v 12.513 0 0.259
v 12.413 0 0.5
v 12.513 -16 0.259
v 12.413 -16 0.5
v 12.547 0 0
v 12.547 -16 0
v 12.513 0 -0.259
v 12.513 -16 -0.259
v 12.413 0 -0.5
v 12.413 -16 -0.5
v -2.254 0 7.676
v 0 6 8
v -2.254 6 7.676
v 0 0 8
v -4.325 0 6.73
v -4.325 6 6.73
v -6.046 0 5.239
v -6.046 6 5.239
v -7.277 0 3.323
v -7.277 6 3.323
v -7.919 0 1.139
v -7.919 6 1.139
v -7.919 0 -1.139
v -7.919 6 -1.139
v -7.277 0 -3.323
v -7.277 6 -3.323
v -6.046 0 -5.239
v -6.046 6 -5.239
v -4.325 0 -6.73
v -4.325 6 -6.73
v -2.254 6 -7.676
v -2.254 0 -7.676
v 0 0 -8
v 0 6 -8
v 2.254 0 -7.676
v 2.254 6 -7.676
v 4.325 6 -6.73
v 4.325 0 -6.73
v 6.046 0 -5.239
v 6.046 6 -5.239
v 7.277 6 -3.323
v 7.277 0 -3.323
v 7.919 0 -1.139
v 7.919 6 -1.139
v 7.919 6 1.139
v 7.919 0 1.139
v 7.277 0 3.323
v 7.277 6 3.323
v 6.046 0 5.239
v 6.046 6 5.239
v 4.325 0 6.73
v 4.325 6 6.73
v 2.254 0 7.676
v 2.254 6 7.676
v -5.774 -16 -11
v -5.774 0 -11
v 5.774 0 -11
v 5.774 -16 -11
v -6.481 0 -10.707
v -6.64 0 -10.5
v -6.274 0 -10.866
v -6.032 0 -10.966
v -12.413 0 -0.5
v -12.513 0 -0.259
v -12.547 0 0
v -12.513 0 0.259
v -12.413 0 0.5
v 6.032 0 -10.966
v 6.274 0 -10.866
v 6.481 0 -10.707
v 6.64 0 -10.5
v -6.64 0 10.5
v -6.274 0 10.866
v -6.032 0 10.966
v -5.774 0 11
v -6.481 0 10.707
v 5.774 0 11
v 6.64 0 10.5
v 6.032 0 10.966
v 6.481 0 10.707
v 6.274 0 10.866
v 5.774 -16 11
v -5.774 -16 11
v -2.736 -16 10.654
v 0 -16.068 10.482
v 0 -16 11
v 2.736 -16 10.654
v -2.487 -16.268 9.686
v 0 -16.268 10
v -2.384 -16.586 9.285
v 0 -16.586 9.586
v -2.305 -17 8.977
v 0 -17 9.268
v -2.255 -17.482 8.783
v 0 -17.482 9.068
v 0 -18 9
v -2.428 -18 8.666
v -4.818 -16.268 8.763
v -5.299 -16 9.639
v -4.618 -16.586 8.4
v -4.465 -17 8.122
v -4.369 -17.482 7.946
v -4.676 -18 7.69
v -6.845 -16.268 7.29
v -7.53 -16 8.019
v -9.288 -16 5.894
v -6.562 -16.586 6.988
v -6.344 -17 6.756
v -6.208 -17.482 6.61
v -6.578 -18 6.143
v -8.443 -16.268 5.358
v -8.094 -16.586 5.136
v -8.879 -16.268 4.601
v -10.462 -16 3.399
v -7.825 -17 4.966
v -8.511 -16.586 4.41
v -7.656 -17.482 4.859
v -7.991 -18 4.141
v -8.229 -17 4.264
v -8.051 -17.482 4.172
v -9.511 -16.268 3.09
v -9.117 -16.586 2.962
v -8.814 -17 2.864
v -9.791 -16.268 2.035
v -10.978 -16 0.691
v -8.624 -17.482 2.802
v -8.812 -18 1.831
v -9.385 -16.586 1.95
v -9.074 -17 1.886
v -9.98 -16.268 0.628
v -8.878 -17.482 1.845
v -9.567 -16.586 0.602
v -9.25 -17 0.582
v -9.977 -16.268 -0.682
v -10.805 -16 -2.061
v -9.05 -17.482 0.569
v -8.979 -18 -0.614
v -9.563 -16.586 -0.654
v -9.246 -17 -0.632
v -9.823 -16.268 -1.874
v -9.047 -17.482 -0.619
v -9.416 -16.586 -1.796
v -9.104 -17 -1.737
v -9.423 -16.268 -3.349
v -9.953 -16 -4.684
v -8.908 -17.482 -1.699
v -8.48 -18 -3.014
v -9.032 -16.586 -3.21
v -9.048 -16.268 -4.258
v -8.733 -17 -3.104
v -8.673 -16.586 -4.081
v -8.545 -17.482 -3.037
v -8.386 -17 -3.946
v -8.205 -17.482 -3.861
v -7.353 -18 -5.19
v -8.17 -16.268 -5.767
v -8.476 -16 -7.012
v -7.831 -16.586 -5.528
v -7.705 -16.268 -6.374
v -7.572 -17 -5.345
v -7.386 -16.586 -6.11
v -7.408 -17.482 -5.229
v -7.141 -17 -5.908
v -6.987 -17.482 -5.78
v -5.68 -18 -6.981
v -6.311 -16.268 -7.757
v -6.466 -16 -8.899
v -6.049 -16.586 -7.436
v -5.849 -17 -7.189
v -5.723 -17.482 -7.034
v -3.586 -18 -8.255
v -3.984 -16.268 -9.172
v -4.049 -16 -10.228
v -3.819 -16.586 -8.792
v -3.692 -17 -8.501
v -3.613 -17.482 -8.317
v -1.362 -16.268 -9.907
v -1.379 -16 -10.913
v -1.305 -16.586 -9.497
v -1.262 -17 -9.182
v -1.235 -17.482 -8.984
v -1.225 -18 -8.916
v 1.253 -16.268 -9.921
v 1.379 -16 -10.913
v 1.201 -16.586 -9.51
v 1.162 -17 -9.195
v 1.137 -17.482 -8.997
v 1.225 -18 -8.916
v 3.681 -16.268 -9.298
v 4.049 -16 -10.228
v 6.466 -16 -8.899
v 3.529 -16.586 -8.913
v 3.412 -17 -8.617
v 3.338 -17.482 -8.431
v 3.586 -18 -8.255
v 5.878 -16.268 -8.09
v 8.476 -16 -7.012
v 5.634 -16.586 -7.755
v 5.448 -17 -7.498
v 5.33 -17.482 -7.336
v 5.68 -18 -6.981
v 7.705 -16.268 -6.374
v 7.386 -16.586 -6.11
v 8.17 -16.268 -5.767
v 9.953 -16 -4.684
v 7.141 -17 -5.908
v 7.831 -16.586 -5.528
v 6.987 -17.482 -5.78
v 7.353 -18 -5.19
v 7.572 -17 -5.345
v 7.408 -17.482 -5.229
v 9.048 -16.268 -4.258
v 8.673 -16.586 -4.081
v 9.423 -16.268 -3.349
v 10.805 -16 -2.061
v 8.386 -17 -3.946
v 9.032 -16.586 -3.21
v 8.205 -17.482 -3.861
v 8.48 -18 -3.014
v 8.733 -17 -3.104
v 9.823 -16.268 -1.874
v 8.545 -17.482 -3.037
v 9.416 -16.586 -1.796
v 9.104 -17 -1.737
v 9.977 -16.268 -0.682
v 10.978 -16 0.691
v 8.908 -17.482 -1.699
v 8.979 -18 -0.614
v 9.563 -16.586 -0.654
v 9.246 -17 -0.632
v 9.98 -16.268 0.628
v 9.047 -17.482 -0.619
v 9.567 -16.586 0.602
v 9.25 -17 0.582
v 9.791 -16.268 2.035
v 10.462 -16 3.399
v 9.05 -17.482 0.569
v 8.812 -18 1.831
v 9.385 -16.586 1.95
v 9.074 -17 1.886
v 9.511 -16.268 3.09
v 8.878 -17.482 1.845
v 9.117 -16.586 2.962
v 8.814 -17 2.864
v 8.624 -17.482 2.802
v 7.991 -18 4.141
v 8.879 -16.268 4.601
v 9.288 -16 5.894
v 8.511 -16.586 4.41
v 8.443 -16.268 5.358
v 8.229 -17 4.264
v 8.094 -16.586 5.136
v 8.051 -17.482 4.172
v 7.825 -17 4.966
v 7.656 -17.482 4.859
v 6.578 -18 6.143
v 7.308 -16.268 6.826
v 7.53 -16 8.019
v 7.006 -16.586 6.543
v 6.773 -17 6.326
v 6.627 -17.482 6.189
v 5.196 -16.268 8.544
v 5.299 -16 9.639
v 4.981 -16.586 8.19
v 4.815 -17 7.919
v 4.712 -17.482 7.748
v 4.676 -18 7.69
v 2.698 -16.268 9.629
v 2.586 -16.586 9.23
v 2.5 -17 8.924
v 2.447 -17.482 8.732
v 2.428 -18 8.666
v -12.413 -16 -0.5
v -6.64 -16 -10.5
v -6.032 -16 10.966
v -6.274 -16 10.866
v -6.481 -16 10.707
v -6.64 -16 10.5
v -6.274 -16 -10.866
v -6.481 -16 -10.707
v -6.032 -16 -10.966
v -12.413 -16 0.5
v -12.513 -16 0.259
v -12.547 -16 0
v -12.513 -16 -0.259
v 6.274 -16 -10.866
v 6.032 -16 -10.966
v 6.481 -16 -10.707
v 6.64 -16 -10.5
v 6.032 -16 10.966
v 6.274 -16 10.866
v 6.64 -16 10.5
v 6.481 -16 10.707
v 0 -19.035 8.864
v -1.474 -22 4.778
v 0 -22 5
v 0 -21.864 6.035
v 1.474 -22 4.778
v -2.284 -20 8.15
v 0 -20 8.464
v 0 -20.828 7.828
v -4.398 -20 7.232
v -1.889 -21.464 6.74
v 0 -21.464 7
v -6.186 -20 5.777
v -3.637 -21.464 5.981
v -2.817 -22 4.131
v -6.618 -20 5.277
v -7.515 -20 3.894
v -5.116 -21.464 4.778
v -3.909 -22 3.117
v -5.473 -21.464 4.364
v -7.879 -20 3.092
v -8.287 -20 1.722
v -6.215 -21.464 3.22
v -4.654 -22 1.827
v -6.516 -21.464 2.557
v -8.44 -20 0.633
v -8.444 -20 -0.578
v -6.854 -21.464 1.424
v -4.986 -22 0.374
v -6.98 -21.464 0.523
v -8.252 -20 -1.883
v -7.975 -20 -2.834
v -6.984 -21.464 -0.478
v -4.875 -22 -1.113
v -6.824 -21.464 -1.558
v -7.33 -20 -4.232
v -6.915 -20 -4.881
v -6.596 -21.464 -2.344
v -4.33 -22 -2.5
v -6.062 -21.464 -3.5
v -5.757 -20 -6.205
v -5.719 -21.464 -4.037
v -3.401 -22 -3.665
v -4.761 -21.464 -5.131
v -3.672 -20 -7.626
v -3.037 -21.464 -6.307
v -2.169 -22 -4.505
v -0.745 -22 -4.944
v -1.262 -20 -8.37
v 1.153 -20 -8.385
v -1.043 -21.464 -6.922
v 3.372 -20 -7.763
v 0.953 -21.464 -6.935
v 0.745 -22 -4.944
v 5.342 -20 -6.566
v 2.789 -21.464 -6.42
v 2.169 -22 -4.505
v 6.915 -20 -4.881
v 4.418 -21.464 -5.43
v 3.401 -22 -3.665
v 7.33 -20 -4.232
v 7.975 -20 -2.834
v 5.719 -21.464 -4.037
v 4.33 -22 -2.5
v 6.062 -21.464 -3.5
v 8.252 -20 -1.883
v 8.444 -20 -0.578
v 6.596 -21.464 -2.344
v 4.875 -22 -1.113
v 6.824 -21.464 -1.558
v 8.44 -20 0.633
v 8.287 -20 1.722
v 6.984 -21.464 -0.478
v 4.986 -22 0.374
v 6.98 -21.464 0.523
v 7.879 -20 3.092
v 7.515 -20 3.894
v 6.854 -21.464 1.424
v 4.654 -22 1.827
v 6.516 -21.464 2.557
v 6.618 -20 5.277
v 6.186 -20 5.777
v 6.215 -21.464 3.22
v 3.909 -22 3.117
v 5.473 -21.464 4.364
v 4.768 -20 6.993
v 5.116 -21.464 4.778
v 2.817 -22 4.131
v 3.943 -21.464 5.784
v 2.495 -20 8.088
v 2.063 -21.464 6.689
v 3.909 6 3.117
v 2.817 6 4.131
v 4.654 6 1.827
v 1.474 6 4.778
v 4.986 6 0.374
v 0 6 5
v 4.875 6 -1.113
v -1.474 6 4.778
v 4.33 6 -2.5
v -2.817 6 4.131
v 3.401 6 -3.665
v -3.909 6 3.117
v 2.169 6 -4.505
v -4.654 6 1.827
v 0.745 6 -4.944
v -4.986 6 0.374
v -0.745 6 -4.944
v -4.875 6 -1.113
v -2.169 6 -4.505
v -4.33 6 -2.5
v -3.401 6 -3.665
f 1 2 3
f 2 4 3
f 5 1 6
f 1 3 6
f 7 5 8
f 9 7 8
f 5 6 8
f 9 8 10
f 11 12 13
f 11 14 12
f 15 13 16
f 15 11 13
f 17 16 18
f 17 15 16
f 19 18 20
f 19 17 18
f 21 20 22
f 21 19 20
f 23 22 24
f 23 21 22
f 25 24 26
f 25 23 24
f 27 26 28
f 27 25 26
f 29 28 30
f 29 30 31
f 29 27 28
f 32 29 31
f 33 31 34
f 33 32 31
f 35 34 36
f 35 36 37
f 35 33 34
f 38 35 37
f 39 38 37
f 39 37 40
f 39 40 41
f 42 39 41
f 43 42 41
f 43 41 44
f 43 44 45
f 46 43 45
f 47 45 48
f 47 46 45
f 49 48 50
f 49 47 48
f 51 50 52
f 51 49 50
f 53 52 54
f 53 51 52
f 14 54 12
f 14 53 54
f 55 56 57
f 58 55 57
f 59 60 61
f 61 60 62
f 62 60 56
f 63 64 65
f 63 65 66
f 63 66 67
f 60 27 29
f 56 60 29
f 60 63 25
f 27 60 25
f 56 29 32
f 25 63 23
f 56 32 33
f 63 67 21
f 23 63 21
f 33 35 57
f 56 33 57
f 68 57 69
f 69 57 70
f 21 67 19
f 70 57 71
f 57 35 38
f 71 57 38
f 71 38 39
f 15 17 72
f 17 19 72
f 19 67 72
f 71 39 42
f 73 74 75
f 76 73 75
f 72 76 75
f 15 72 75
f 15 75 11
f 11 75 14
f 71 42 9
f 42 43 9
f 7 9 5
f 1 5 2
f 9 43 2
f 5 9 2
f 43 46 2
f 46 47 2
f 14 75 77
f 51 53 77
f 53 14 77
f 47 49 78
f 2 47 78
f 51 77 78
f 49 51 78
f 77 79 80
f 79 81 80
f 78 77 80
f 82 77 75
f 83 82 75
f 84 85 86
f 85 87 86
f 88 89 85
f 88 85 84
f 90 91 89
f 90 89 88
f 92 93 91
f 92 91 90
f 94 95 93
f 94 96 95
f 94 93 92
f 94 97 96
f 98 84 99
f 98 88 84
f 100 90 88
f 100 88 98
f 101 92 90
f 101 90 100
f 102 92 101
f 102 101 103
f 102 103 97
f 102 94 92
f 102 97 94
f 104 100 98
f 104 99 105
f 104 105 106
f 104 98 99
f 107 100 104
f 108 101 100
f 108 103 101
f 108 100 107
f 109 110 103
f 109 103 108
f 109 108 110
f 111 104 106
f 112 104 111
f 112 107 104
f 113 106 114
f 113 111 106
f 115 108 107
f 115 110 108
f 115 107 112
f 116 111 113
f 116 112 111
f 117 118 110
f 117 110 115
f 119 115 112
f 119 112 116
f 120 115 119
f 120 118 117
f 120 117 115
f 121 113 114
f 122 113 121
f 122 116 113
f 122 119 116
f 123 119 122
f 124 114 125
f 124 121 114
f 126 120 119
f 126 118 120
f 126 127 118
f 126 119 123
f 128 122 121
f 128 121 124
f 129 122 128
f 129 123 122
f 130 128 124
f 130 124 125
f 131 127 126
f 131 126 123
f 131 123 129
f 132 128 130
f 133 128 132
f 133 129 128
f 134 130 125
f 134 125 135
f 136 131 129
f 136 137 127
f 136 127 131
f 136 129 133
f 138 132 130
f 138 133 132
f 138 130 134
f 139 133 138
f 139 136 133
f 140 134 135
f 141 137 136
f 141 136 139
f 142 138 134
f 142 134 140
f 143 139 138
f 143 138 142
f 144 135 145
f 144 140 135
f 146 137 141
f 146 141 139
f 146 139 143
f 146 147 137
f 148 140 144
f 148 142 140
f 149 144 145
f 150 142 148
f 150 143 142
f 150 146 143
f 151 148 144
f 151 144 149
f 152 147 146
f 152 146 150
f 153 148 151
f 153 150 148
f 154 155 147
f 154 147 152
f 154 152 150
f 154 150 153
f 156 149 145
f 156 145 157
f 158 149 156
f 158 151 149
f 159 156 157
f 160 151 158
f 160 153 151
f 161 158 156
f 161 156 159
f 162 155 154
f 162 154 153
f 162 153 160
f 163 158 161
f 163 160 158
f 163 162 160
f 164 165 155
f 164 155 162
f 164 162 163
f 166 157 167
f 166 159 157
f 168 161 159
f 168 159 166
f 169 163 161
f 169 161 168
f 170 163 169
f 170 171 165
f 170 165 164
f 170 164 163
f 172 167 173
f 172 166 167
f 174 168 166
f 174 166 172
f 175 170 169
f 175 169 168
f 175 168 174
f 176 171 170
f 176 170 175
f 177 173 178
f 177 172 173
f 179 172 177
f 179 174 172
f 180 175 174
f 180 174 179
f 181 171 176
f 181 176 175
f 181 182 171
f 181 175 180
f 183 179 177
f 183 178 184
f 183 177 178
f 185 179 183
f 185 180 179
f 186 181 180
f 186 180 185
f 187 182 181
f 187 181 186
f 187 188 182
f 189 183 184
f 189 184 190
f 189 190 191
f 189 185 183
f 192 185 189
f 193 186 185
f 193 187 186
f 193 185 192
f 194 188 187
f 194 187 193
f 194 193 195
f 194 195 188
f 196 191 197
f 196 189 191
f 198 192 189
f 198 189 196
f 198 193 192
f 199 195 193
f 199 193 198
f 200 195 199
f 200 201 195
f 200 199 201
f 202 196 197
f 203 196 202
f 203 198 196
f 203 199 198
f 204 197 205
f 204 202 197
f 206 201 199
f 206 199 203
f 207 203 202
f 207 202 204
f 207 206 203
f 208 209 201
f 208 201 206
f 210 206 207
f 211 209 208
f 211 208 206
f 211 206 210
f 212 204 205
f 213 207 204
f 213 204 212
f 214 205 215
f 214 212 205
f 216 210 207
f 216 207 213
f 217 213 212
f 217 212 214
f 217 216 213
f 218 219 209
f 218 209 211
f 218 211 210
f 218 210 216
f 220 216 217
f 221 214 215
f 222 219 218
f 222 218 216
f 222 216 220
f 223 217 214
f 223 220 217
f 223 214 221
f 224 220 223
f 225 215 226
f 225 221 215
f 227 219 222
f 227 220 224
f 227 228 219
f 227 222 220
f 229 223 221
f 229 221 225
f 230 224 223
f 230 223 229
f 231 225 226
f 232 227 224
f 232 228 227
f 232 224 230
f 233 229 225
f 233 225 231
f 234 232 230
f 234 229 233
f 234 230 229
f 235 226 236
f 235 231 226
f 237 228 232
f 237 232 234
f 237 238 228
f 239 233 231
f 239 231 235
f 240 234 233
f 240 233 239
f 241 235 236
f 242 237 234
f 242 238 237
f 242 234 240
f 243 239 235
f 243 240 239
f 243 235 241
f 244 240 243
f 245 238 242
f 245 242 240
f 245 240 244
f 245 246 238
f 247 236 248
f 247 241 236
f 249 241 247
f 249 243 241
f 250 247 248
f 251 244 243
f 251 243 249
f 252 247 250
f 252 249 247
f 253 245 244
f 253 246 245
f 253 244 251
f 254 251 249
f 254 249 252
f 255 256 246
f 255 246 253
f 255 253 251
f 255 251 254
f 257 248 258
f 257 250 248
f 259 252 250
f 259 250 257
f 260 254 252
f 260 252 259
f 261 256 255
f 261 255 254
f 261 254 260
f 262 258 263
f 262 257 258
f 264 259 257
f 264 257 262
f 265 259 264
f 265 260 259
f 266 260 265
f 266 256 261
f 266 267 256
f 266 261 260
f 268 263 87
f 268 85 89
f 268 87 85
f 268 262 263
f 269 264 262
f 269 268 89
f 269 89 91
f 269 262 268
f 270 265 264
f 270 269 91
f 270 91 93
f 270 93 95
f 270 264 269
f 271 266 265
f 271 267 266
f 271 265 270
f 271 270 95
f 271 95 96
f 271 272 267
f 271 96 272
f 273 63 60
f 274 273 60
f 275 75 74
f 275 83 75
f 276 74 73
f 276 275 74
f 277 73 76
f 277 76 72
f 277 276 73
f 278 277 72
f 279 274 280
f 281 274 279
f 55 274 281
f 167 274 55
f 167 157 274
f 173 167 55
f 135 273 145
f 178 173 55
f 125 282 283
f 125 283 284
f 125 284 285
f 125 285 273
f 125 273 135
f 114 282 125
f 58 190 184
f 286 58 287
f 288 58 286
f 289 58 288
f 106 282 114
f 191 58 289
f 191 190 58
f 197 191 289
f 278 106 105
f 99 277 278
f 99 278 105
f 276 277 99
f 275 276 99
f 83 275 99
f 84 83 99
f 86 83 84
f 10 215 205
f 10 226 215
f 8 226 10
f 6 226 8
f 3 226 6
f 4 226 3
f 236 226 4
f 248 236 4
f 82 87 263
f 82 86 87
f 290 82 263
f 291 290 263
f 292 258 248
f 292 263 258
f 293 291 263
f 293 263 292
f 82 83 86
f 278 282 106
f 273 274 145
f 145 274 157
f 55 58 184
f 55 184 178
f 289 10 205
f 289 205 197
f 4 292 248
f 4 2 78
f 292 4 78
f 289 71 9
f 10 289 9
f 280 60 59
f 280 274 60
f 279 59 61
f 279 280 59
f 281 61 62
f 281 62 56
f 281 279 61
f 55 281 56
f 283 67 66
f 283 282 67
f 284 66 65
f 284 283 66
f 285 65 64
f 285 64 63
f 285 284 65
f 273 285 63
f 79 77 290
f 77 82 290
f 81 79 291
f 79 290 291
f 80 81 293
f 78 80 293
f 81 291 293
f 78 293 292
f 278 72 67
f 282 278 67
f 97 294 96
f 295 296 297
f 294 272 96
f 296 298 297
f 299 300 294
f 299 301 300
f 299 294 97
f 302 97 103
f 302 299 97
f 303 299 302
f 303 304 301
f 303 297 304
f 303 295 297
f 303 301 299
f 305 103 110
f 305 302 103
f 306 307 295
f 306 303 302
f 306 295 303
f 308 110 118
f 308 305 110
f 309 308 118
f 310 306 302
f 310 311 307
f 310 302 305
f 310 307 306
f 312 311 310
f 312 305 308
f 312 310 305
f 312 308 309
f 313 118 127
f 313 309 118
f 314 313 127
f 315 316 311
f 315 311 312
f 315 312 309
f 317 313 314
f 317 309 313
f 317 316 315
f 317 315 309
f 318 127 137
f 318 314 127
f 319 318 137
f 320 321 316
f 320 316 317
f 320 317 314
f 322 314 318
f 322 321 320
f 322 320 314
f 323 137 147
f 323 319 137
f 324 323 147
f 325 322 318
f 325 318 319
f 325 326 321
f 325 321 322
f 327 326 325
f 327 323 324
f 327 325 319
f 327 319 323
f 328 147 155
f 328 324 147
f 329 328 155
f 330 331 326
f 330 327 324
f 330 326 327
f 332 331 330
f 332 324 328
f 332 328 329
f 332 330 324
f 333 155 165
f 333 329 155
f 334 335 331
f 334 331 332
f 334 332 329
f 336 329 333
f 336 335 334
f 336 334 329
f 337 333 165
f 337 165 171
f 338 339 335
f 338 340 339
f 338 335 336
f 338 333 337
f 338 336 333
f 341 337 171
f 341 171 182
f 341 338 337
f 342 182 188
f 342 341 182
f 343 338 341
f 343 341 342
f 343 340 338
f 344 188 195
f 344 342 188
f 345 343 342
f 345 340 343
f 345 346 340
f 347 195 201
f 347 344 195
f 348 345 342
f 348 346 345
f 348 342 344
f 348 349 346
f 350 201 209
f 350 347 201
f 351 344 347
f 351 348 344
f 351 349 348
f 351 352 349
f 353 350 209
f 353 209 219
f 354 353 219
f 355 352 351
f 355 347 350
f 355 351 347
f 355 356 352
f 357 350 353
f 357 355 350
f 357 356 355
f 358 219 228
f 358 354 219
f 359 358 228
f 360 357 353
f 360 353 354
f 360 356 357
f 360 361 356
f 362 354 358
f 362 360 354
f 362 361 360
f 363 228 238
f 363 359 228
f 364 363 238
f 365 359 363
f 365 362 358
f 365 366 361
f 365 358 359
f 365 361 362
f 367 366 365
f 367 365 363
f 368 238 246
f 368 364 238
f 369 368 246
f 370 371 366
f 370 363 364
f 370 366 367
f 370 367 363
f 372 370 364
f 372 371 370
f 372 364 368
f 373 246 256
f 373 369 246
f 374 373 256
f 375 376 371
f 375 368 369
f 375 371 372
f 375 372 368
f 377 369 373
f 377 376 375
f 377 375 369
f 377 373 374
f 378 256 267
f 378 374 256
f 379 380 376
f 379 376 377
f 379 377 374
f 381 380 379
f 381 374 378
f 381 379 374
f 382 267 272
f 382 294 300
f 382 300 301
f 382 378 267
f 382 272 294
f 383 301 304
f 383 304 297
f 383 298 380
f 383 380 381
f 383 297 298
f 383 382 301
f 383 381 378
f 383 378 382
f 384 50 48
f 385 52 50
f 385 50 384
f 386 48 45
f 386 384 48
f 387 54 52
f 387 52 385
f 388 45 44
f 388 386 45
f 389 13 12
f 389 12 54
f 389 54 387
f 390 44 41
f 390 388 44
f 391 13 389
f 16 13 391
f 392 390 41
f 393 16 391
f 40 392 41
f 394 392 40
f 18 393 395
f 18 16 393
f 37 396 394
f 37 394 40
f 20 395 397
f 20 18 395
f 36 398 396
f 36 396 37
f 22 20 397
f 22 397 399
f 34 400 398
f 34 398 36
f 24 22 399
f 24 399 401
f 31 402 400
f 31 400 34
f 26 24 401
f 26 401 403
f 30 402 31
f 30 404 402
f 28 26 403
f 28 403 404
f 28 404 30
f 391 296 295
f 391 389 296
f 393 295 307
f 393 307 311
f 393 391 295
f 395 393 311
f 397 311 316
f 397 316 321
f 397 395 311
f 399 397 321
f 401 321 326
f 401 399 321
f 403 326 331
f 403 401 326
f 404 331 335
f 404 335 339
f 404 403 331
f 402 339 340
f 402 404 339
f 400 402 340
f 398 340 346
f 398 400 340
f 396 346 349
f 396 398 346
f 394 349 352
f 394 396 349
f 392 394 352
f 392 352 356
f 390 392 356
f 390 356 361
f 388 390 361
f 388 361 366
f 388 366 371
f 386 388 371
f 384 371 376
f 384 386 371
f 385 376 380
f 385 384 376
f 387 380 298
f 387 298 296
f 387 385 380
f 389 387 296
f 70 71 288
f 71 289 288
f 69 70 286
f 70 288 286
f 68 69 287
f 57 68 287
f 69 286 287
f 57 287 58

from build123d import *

# Parameters (mm, degrees)
F0_R     = 5
F3_DEPTH = 16
F4_R     = 1.99999
F5_R     = 1


# Not quite as in the source:
# - a fillet or chamfer is up to 0.001 mm smaller than in the source, because OpenCascade refuses the exact size


with BuildPart() as f2:
    # F1 (on Right) → F2 (revolve)
    with BuildSketch(Plane.YZ):
        with BuildLine():
            Line((0, 8), (0, 9))
            Line((0, 9), (-18, 9))
            ThreePointArc((-18, 9), (-20.8284271247, 7.8284271247), (-22, 5))
            Line((-22, 5), (0, 5))
            Line((0, 5), (6, 5))
            Line((6, 5), (6, 8))
            Line((6, 8), (0, 8))
        make_face()
    revolve(axis=Axis((0, -24.3240110576, 0), (0, -1, 0)))

    # F0 (on Front) → F3 (join)
    with BuildSketch(Plane.XZ):
        Polygon((6.3508529611, 11), (-6.3508529611, 11), (-12.7017059222, 0), (-6.3508529611, -11), (6.3508529611, -11), (12.7017059222, 0), align=None)
        Circle(F0_R, mode=Mode.SUBTRACT)
    extrude(amount=F3_DEPTH)

    # F4 (radius 2 in the source; OpenCascade refuses exactly that, so slightly less here)
    f4_edges = [f2.edges().sort_by_distance(p)[0] for p in [
        (0, -16, -9),
    ]]
    fillet(f4_edges, radius=F4_R)

    # F5
    f5_edges = [f2.edges().sort_by_distance(p)[0] for p in [
        (-6.350853, -8, 11),
        (-12.701706, -8, 0),
        (-6.350853, -8, -11),
        (6.350853, -8, -11),
        (12.701706, -8, 0),
        (6.350853, -8, 11),
    ]]
    fillet(f5_edges, radius=F5_R)


solid = f2.part
